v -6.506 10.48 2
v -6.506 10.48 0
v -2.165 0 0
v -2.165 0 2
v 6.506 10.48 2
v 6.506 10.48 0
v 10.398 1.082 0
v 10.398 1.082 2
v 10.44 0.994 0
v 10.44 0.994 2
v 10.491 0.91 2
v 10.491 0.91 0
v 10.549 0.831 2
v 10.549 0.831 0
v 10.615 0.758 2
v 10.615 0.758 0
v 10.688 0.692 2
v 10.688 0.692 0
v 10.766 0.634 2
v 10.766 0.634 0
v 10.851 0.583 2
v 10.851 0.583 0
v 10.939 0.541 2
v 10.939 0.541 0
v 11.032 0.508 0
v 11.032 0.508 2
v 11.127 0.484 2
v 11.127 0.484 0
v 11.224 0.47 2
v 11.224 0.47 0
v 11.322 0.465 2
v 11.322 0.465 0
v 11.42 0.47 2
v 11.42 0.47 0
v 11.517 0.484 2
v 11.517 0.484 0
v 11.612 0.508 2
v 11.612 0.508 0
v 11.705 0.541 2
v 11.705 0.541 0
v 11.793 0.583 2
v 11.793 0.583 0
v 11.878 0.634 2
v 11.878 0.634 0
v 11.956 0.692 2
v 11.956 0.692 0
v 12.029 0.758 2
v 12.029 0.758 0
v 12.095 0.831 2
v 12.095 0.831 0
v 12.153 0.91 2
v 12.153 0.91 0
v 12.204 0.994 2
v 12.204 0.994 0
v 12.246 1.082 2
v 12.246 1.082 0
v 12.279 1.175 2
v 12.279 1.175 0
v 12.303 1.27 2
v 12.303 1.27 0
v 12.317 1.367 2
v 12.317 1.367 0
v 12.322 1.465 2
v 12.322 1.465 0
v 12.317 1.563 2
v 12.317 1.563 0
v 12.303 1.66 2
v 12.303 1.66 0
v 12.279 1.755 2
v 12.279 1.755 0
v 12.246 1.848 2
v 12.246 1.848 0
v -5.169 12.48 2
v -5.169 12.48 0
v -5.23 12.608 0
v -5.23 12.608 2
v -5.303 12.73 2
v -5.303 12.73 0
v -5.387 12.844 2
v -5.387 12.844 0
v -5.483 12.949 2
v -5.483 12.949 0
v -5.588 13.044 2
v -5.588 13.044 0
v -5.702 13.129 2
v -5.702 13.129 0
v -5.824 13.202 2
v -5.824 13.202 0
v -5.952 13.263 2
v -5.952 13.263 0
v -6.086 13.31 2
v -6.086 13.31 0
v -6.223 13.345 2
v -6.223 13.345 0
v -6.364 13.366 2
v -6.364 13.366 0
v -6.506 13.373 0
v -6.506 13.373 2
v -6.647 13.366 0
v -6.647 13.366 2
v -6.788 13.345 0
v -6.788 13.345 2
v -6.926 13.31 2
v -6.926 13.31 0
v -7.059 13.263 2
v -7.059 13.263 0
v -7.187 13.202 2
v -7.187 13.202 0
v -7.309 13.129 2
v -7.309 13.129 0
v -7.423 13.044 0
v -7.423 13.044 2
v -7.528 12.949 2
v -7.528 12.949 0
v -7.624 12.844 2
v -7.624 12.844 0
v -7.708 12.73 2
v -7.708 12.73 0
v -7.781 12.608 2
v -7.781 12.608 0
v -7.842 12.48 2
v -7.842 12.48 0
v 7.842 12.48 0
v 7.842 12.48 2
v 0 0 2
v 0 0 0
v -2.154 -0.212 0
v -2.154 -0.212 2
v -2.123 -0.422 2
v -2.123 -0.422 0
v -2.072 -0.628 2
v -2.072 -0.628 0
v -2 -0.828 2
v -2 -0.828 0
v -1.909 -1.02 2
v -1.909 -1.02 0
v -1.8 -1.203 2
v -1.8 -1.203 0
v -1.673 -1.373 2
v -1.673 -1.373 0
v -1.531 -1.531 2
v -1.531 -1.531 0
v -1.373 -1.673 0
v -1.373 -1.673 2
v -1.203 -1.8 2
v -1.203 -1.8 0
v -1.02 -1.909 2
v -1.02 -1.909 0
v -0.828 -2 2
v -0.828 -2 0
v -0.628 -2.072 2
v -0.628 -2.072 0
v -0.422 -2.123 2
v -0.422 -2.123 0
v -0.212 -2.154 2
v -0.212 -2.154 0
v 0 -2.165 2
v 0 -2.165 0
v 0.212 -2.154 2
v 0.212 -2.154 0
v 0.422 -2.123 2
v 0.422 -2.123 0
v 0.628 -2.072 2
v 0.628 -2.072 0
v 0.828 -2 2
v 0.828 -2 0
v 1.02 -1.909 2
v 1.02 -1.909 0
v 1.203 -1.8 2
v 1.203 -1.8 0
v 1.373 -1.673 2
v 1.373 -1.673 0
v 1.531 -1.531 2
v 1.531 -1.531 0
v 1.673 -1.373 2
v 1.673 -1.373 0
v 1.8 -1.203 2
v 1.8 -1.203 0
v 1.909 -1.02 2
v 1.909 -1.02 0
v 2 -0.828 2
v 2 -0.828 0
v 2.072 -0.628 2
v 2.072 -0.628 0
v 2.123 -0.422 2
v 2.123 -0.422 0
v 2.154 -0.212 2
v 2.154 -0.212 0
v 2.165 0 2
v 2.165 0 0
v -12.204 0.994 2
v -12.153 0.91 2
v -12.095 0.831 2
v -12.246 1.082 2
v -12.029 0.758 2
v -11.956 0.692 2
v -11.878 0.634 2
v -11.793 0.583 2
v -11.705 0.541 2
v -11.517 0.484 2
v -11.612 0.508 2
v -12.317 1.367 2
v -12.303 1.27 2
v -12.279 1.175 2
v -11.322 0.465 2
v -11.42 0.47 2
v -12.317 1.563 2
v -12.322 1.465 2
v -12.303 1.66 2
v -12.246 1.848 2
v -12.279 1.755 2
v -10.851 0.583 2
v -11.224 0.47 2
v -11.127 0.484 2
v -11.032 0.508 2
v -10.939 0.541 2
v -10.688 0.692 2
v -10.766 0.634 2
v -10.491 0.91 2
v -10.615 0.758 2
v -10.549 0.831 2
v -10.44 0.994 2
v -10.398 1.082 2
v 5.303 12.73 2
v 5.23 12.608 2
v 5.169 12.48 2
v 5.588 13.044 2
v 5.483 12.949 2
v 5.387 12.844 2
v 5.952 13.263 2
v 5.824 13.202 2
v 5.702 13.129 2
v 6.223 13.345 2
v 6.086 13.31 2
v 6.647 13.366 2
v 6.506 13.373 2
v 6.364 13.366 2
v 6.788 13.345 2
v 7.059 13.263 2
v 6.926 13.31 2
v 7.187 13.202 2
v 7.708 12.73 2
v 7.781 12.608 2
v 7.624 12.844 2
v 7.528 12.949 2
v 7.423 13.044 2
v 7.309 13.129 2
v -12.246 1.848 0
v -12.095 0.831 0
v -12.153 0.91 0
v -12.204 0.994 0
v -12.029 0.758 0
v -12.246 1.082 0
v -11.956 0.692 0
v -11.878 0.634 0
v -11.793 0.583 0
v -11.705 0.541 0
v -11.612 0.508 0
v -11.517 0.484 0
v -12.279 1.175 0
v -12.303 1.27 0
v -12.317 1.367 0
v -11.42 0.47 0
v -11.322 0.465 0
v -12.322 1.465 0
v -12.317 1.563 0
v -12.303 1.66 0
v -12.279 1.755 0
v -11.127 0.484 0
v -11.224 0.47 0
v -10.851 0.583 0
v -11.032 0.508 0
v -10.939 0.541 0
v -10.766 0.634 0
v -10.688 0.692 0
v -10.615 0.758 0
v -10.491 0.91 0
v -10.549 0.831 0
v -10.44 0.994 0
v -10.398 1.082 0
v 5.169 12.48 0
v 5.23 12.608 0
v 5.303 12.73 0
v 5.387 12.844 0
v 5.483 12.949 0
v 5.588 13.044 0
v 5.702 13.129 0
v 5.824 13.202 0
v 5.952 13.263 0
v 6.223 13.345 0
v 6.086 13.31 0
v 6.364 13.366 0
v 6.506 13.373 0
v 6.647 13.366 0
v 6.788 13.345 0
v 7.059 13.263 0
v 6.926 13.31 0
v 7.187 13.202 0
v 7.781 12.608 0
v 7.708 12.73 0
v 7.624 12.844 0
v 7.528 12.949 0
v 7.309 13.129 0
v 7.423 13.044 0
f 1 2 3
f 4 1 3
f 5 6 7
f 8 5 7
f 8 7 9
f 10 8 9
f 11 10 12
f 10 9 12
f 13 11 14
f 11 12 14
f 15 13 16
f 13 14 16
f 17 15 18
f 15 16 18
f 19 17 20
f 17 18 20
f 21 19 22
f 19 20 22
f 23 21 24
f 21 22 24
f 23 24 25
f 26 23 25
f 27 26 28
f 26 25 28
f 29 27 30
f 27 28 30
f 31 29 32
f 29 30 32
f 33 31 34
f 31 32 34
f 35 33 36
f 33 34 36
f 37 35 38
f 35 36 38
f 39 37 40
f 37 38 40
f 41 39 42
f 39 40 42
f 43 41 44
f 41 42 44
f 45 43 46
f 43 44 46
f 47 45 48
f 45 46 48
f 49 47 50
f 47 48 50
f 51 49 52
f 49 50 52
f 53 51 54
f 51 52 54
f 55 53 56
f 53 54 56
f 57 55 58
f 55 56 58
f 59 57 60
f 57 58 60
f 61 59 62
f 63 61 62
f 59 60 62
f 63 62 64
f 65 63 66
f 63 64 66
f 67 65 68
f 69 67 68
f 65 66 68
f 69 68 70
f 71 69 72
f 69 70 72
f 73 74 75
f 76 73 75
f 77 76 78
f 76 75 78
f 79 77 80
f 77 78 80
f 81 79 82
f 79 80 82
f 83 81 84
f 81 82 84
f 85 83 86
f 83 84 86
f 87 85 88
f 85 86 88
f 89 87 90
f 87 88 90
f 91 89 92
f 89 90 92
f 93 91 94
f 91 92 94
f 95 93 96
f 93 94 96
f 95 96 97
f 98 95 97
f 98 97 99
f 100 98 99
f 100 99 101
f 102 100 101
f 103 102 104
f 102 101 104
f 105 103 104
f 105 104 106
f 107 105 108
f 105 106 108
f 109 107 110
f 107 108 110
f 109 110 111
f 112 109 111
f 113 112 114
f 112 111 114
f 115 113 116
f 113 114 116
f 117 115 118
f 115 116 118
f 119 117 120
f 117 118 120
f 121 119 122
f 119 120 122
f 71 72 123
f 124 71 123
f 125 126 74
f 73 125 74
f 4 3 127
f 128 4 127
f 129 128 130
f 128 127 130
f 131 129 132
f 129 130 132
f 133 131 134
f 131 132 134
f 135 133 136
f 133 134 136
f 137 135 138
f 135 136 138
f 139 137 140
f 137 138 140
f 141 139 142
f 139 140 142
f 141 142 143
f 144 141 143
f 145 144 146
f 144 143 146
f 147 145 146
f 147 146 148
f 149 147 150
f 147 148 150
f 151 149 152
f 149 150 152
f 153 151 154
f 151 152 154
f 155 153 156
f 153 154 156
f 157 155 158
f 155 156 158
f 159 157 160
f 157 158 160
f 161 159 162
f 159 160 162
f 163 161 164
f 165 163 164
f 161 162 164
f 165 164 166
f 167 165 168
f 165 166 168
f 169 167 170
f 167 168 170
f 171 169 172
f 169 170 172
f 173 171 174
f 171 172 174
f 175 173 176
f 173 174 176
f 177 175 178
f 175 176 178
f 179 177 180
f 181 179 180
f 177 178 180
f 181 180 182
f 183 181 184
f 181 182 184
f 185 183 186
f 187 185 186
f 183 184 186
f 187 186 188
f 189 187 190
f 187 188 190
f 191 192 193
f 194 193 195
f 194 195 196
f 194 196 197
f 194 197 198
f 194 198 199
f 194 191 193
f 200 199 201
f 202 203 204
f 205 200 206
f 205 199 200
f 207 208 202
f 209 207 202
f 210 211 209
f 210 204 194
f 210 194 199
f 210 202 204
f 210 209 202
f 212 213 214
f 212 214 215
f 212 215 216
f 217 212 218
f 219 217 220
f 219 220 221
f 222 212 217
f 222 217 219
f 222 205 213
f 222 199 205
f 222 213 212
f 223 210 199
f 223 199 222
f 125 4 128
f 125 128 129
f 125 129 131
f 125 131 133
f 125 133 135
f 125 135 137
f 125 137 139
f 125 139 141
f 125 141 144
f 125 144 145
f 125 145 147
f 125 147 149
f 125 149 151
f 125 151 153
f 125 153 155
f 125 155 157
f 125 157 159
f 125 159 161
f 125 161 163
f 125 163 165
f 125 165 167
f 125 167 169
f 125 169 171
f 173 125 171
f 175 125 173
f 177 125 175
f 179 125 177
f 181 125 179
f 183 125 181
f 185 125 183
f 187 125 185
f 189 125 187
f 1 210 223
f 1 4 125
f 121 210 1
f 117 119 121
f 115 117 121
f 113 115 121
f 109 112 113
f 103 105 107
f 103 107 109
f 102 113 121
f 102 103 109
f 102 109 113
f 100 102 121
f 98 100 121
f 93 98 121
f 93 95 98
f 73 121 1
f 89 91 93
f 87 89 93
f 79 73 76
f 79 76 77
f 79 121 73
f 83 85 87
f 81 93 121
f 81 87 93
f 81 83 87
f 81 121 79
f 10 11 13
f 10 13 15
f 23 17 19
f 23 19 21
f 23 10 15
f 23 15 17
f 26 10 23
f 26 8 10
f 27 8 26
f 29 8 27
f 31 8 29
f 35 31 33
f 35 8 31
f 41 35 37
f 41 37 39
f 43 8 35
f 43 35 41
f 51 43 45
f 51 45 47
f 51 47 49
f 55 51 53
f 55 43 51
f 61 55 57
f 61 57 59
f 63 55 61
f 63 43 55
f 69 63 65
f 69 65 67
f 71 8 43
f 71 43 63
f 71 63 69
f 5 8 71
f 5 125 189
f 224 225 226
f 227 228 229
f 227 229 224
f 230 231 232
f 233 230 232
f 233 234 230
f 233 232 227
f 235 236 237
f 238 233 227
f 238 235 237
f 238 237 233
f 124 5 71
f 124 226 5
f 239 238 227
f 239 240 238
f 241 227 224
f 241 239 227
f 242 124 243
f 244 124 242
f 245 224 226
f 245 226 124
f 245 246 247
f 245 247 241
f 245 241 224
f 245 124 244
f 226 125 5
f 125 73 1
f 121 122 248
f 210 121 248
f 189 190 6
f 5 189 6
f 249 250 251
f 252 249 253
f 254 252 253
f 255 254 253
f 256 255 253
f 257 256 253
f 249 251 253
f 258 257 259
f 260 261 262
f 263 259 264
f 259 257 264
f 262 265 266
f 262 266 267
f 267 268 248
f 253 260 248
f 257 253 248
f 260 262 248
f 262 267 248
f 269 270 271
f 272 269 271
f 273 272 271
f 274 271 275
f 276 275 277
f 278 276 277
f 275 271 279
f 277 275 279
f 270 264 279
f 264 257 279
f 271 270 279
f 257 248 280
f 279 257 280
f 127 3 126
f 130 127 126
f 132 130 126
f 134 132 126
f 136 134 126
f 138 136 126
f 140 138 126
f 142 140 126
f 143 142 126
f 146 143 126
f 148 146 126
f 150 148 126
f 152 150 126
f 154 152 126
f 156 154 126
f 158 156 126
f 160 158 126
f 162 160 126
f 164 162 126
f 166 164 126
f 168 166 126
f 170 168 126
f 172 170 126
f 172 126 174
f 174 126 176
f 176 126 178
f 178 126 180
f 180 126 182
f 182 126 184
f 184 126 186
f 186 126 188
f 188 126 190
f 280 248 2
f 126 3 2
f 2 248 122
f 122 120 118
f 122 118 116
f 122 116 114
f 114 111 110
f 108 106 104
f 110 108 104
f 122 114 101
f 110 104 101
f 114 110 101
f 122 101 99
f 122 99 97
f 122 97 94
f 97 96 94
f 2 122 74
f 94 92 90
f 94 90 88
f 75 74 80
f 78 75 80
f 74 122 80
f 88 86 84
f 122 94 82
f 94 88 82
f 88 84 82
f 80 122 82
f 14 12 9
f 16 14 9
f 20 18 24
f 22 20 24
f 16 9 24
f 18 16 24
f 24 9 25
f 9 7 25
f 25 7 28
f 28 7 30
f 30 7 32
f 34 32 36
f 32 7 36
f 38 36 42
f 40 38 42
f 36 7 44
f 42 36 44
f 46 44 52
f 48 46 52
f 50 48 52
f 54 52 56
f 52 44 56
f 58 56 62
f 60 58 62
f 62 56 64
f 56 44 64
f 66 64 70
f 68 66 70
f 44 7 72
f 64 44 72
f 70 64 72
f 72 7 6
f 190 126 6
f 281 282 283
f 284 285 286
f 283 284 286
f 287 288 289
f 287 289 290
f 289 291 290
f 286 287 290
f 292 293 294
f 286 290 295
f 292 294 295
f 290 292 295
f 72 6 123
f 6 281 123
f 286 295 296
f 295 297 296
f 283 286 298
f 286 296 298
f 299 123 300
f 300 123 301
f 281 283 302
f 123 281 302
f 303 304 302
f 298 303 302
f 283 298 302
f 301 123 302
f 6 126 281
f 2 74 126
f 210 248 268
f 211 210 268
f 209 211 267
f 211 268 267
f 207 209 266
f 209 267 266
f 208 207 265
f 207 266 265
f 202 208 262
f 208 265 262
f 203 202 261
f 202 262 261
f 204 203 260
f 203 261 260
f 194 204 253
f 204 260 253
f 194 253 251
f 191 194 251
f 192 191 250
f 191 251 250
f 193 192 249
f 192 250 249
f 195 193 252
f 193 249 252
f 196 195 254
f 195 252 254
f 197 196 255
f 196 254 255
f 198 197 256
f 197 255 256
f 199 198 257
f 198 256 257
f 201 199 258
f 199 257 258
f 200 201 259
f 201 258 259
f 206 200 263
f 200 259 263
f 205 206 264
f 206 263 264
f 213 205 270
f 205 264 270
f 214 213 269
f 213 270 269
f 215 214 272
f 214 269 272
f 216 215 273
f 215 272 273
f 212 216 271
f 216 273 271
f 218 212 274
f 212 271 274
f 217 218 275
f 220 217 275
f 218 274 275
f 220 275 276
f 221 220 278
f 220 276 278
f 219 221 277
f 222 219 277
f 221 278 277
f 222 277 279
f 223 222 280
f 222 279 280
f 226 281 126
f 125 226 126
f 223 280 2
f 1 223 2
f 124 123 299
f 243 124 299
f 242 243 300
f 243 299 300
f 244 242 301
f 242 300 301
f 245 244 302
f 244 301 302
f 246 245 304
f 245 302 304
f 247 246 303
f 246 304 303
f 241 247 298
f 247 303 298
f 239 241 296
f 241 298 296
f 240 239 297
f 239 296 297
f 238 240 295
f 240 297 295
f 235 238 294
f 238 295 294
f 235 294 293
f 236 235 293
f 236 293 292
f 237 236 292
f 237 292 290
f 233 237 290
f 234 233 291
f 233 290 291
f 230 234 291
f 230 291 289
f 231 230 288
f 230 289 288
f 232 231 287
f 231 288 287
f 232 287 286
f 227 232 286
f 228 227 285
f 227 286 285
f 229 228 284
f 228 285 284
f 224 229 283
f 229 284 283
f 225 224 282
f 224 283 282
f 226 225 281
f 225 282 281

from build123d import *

# Parameters (mm, degrees)
F1_DEPTH = 2


with BuildPart() as f1:
    # F0 (on Top) → F1 (new body)
    with BuildSketch(Plane.XY):
        with BuildLine():
            Line((5.169261, 12.4797), (0, 0))
            Line((0, 0), (-5.169261, 12.4797))
            ThreePointArc((-5.169261, 12.4797), (-6.505618, 13.372626), (-7.841976, 12.4797))
            Line((-7.841976, 12.4797), (-12.24587, 1.847759))
            ThreePointArc((-12.24587, 1.847759), (-11.704674, 0.541196), (-10.398111, 1.082392))
            Line((-10.398111, 1.082392), (-6.505618, 10.4797))
            Line((-6.505618, 10.4797), (-2.164784, 0))
            ThreePointArc((-2.164784, 0), (0, -2.164784), (2.164784, 0))
            Line((2.164784, 0), (6.505618, 10.4797))
            Line((6.505618, 10.4797), (10.398111, 1.082392))
            ThreePointArc((10.398111, 1.082392), (10.939307, 0.541196), (11.704674, 0.541196))
            ThreePointArc((11.704674, 0.541196), (12.24587, 1.082392), (12.24587, 1.847759))
            Line((12.24587, 1.847759), (7.841976, 12.4797))
            ThreePointArc((7.841976, 12.4797), (6.505618, 13.372626), (5.169261, 12.4797))
        make_face()
    extrude(amount=F1_DEPTH)


solid = f1.part
